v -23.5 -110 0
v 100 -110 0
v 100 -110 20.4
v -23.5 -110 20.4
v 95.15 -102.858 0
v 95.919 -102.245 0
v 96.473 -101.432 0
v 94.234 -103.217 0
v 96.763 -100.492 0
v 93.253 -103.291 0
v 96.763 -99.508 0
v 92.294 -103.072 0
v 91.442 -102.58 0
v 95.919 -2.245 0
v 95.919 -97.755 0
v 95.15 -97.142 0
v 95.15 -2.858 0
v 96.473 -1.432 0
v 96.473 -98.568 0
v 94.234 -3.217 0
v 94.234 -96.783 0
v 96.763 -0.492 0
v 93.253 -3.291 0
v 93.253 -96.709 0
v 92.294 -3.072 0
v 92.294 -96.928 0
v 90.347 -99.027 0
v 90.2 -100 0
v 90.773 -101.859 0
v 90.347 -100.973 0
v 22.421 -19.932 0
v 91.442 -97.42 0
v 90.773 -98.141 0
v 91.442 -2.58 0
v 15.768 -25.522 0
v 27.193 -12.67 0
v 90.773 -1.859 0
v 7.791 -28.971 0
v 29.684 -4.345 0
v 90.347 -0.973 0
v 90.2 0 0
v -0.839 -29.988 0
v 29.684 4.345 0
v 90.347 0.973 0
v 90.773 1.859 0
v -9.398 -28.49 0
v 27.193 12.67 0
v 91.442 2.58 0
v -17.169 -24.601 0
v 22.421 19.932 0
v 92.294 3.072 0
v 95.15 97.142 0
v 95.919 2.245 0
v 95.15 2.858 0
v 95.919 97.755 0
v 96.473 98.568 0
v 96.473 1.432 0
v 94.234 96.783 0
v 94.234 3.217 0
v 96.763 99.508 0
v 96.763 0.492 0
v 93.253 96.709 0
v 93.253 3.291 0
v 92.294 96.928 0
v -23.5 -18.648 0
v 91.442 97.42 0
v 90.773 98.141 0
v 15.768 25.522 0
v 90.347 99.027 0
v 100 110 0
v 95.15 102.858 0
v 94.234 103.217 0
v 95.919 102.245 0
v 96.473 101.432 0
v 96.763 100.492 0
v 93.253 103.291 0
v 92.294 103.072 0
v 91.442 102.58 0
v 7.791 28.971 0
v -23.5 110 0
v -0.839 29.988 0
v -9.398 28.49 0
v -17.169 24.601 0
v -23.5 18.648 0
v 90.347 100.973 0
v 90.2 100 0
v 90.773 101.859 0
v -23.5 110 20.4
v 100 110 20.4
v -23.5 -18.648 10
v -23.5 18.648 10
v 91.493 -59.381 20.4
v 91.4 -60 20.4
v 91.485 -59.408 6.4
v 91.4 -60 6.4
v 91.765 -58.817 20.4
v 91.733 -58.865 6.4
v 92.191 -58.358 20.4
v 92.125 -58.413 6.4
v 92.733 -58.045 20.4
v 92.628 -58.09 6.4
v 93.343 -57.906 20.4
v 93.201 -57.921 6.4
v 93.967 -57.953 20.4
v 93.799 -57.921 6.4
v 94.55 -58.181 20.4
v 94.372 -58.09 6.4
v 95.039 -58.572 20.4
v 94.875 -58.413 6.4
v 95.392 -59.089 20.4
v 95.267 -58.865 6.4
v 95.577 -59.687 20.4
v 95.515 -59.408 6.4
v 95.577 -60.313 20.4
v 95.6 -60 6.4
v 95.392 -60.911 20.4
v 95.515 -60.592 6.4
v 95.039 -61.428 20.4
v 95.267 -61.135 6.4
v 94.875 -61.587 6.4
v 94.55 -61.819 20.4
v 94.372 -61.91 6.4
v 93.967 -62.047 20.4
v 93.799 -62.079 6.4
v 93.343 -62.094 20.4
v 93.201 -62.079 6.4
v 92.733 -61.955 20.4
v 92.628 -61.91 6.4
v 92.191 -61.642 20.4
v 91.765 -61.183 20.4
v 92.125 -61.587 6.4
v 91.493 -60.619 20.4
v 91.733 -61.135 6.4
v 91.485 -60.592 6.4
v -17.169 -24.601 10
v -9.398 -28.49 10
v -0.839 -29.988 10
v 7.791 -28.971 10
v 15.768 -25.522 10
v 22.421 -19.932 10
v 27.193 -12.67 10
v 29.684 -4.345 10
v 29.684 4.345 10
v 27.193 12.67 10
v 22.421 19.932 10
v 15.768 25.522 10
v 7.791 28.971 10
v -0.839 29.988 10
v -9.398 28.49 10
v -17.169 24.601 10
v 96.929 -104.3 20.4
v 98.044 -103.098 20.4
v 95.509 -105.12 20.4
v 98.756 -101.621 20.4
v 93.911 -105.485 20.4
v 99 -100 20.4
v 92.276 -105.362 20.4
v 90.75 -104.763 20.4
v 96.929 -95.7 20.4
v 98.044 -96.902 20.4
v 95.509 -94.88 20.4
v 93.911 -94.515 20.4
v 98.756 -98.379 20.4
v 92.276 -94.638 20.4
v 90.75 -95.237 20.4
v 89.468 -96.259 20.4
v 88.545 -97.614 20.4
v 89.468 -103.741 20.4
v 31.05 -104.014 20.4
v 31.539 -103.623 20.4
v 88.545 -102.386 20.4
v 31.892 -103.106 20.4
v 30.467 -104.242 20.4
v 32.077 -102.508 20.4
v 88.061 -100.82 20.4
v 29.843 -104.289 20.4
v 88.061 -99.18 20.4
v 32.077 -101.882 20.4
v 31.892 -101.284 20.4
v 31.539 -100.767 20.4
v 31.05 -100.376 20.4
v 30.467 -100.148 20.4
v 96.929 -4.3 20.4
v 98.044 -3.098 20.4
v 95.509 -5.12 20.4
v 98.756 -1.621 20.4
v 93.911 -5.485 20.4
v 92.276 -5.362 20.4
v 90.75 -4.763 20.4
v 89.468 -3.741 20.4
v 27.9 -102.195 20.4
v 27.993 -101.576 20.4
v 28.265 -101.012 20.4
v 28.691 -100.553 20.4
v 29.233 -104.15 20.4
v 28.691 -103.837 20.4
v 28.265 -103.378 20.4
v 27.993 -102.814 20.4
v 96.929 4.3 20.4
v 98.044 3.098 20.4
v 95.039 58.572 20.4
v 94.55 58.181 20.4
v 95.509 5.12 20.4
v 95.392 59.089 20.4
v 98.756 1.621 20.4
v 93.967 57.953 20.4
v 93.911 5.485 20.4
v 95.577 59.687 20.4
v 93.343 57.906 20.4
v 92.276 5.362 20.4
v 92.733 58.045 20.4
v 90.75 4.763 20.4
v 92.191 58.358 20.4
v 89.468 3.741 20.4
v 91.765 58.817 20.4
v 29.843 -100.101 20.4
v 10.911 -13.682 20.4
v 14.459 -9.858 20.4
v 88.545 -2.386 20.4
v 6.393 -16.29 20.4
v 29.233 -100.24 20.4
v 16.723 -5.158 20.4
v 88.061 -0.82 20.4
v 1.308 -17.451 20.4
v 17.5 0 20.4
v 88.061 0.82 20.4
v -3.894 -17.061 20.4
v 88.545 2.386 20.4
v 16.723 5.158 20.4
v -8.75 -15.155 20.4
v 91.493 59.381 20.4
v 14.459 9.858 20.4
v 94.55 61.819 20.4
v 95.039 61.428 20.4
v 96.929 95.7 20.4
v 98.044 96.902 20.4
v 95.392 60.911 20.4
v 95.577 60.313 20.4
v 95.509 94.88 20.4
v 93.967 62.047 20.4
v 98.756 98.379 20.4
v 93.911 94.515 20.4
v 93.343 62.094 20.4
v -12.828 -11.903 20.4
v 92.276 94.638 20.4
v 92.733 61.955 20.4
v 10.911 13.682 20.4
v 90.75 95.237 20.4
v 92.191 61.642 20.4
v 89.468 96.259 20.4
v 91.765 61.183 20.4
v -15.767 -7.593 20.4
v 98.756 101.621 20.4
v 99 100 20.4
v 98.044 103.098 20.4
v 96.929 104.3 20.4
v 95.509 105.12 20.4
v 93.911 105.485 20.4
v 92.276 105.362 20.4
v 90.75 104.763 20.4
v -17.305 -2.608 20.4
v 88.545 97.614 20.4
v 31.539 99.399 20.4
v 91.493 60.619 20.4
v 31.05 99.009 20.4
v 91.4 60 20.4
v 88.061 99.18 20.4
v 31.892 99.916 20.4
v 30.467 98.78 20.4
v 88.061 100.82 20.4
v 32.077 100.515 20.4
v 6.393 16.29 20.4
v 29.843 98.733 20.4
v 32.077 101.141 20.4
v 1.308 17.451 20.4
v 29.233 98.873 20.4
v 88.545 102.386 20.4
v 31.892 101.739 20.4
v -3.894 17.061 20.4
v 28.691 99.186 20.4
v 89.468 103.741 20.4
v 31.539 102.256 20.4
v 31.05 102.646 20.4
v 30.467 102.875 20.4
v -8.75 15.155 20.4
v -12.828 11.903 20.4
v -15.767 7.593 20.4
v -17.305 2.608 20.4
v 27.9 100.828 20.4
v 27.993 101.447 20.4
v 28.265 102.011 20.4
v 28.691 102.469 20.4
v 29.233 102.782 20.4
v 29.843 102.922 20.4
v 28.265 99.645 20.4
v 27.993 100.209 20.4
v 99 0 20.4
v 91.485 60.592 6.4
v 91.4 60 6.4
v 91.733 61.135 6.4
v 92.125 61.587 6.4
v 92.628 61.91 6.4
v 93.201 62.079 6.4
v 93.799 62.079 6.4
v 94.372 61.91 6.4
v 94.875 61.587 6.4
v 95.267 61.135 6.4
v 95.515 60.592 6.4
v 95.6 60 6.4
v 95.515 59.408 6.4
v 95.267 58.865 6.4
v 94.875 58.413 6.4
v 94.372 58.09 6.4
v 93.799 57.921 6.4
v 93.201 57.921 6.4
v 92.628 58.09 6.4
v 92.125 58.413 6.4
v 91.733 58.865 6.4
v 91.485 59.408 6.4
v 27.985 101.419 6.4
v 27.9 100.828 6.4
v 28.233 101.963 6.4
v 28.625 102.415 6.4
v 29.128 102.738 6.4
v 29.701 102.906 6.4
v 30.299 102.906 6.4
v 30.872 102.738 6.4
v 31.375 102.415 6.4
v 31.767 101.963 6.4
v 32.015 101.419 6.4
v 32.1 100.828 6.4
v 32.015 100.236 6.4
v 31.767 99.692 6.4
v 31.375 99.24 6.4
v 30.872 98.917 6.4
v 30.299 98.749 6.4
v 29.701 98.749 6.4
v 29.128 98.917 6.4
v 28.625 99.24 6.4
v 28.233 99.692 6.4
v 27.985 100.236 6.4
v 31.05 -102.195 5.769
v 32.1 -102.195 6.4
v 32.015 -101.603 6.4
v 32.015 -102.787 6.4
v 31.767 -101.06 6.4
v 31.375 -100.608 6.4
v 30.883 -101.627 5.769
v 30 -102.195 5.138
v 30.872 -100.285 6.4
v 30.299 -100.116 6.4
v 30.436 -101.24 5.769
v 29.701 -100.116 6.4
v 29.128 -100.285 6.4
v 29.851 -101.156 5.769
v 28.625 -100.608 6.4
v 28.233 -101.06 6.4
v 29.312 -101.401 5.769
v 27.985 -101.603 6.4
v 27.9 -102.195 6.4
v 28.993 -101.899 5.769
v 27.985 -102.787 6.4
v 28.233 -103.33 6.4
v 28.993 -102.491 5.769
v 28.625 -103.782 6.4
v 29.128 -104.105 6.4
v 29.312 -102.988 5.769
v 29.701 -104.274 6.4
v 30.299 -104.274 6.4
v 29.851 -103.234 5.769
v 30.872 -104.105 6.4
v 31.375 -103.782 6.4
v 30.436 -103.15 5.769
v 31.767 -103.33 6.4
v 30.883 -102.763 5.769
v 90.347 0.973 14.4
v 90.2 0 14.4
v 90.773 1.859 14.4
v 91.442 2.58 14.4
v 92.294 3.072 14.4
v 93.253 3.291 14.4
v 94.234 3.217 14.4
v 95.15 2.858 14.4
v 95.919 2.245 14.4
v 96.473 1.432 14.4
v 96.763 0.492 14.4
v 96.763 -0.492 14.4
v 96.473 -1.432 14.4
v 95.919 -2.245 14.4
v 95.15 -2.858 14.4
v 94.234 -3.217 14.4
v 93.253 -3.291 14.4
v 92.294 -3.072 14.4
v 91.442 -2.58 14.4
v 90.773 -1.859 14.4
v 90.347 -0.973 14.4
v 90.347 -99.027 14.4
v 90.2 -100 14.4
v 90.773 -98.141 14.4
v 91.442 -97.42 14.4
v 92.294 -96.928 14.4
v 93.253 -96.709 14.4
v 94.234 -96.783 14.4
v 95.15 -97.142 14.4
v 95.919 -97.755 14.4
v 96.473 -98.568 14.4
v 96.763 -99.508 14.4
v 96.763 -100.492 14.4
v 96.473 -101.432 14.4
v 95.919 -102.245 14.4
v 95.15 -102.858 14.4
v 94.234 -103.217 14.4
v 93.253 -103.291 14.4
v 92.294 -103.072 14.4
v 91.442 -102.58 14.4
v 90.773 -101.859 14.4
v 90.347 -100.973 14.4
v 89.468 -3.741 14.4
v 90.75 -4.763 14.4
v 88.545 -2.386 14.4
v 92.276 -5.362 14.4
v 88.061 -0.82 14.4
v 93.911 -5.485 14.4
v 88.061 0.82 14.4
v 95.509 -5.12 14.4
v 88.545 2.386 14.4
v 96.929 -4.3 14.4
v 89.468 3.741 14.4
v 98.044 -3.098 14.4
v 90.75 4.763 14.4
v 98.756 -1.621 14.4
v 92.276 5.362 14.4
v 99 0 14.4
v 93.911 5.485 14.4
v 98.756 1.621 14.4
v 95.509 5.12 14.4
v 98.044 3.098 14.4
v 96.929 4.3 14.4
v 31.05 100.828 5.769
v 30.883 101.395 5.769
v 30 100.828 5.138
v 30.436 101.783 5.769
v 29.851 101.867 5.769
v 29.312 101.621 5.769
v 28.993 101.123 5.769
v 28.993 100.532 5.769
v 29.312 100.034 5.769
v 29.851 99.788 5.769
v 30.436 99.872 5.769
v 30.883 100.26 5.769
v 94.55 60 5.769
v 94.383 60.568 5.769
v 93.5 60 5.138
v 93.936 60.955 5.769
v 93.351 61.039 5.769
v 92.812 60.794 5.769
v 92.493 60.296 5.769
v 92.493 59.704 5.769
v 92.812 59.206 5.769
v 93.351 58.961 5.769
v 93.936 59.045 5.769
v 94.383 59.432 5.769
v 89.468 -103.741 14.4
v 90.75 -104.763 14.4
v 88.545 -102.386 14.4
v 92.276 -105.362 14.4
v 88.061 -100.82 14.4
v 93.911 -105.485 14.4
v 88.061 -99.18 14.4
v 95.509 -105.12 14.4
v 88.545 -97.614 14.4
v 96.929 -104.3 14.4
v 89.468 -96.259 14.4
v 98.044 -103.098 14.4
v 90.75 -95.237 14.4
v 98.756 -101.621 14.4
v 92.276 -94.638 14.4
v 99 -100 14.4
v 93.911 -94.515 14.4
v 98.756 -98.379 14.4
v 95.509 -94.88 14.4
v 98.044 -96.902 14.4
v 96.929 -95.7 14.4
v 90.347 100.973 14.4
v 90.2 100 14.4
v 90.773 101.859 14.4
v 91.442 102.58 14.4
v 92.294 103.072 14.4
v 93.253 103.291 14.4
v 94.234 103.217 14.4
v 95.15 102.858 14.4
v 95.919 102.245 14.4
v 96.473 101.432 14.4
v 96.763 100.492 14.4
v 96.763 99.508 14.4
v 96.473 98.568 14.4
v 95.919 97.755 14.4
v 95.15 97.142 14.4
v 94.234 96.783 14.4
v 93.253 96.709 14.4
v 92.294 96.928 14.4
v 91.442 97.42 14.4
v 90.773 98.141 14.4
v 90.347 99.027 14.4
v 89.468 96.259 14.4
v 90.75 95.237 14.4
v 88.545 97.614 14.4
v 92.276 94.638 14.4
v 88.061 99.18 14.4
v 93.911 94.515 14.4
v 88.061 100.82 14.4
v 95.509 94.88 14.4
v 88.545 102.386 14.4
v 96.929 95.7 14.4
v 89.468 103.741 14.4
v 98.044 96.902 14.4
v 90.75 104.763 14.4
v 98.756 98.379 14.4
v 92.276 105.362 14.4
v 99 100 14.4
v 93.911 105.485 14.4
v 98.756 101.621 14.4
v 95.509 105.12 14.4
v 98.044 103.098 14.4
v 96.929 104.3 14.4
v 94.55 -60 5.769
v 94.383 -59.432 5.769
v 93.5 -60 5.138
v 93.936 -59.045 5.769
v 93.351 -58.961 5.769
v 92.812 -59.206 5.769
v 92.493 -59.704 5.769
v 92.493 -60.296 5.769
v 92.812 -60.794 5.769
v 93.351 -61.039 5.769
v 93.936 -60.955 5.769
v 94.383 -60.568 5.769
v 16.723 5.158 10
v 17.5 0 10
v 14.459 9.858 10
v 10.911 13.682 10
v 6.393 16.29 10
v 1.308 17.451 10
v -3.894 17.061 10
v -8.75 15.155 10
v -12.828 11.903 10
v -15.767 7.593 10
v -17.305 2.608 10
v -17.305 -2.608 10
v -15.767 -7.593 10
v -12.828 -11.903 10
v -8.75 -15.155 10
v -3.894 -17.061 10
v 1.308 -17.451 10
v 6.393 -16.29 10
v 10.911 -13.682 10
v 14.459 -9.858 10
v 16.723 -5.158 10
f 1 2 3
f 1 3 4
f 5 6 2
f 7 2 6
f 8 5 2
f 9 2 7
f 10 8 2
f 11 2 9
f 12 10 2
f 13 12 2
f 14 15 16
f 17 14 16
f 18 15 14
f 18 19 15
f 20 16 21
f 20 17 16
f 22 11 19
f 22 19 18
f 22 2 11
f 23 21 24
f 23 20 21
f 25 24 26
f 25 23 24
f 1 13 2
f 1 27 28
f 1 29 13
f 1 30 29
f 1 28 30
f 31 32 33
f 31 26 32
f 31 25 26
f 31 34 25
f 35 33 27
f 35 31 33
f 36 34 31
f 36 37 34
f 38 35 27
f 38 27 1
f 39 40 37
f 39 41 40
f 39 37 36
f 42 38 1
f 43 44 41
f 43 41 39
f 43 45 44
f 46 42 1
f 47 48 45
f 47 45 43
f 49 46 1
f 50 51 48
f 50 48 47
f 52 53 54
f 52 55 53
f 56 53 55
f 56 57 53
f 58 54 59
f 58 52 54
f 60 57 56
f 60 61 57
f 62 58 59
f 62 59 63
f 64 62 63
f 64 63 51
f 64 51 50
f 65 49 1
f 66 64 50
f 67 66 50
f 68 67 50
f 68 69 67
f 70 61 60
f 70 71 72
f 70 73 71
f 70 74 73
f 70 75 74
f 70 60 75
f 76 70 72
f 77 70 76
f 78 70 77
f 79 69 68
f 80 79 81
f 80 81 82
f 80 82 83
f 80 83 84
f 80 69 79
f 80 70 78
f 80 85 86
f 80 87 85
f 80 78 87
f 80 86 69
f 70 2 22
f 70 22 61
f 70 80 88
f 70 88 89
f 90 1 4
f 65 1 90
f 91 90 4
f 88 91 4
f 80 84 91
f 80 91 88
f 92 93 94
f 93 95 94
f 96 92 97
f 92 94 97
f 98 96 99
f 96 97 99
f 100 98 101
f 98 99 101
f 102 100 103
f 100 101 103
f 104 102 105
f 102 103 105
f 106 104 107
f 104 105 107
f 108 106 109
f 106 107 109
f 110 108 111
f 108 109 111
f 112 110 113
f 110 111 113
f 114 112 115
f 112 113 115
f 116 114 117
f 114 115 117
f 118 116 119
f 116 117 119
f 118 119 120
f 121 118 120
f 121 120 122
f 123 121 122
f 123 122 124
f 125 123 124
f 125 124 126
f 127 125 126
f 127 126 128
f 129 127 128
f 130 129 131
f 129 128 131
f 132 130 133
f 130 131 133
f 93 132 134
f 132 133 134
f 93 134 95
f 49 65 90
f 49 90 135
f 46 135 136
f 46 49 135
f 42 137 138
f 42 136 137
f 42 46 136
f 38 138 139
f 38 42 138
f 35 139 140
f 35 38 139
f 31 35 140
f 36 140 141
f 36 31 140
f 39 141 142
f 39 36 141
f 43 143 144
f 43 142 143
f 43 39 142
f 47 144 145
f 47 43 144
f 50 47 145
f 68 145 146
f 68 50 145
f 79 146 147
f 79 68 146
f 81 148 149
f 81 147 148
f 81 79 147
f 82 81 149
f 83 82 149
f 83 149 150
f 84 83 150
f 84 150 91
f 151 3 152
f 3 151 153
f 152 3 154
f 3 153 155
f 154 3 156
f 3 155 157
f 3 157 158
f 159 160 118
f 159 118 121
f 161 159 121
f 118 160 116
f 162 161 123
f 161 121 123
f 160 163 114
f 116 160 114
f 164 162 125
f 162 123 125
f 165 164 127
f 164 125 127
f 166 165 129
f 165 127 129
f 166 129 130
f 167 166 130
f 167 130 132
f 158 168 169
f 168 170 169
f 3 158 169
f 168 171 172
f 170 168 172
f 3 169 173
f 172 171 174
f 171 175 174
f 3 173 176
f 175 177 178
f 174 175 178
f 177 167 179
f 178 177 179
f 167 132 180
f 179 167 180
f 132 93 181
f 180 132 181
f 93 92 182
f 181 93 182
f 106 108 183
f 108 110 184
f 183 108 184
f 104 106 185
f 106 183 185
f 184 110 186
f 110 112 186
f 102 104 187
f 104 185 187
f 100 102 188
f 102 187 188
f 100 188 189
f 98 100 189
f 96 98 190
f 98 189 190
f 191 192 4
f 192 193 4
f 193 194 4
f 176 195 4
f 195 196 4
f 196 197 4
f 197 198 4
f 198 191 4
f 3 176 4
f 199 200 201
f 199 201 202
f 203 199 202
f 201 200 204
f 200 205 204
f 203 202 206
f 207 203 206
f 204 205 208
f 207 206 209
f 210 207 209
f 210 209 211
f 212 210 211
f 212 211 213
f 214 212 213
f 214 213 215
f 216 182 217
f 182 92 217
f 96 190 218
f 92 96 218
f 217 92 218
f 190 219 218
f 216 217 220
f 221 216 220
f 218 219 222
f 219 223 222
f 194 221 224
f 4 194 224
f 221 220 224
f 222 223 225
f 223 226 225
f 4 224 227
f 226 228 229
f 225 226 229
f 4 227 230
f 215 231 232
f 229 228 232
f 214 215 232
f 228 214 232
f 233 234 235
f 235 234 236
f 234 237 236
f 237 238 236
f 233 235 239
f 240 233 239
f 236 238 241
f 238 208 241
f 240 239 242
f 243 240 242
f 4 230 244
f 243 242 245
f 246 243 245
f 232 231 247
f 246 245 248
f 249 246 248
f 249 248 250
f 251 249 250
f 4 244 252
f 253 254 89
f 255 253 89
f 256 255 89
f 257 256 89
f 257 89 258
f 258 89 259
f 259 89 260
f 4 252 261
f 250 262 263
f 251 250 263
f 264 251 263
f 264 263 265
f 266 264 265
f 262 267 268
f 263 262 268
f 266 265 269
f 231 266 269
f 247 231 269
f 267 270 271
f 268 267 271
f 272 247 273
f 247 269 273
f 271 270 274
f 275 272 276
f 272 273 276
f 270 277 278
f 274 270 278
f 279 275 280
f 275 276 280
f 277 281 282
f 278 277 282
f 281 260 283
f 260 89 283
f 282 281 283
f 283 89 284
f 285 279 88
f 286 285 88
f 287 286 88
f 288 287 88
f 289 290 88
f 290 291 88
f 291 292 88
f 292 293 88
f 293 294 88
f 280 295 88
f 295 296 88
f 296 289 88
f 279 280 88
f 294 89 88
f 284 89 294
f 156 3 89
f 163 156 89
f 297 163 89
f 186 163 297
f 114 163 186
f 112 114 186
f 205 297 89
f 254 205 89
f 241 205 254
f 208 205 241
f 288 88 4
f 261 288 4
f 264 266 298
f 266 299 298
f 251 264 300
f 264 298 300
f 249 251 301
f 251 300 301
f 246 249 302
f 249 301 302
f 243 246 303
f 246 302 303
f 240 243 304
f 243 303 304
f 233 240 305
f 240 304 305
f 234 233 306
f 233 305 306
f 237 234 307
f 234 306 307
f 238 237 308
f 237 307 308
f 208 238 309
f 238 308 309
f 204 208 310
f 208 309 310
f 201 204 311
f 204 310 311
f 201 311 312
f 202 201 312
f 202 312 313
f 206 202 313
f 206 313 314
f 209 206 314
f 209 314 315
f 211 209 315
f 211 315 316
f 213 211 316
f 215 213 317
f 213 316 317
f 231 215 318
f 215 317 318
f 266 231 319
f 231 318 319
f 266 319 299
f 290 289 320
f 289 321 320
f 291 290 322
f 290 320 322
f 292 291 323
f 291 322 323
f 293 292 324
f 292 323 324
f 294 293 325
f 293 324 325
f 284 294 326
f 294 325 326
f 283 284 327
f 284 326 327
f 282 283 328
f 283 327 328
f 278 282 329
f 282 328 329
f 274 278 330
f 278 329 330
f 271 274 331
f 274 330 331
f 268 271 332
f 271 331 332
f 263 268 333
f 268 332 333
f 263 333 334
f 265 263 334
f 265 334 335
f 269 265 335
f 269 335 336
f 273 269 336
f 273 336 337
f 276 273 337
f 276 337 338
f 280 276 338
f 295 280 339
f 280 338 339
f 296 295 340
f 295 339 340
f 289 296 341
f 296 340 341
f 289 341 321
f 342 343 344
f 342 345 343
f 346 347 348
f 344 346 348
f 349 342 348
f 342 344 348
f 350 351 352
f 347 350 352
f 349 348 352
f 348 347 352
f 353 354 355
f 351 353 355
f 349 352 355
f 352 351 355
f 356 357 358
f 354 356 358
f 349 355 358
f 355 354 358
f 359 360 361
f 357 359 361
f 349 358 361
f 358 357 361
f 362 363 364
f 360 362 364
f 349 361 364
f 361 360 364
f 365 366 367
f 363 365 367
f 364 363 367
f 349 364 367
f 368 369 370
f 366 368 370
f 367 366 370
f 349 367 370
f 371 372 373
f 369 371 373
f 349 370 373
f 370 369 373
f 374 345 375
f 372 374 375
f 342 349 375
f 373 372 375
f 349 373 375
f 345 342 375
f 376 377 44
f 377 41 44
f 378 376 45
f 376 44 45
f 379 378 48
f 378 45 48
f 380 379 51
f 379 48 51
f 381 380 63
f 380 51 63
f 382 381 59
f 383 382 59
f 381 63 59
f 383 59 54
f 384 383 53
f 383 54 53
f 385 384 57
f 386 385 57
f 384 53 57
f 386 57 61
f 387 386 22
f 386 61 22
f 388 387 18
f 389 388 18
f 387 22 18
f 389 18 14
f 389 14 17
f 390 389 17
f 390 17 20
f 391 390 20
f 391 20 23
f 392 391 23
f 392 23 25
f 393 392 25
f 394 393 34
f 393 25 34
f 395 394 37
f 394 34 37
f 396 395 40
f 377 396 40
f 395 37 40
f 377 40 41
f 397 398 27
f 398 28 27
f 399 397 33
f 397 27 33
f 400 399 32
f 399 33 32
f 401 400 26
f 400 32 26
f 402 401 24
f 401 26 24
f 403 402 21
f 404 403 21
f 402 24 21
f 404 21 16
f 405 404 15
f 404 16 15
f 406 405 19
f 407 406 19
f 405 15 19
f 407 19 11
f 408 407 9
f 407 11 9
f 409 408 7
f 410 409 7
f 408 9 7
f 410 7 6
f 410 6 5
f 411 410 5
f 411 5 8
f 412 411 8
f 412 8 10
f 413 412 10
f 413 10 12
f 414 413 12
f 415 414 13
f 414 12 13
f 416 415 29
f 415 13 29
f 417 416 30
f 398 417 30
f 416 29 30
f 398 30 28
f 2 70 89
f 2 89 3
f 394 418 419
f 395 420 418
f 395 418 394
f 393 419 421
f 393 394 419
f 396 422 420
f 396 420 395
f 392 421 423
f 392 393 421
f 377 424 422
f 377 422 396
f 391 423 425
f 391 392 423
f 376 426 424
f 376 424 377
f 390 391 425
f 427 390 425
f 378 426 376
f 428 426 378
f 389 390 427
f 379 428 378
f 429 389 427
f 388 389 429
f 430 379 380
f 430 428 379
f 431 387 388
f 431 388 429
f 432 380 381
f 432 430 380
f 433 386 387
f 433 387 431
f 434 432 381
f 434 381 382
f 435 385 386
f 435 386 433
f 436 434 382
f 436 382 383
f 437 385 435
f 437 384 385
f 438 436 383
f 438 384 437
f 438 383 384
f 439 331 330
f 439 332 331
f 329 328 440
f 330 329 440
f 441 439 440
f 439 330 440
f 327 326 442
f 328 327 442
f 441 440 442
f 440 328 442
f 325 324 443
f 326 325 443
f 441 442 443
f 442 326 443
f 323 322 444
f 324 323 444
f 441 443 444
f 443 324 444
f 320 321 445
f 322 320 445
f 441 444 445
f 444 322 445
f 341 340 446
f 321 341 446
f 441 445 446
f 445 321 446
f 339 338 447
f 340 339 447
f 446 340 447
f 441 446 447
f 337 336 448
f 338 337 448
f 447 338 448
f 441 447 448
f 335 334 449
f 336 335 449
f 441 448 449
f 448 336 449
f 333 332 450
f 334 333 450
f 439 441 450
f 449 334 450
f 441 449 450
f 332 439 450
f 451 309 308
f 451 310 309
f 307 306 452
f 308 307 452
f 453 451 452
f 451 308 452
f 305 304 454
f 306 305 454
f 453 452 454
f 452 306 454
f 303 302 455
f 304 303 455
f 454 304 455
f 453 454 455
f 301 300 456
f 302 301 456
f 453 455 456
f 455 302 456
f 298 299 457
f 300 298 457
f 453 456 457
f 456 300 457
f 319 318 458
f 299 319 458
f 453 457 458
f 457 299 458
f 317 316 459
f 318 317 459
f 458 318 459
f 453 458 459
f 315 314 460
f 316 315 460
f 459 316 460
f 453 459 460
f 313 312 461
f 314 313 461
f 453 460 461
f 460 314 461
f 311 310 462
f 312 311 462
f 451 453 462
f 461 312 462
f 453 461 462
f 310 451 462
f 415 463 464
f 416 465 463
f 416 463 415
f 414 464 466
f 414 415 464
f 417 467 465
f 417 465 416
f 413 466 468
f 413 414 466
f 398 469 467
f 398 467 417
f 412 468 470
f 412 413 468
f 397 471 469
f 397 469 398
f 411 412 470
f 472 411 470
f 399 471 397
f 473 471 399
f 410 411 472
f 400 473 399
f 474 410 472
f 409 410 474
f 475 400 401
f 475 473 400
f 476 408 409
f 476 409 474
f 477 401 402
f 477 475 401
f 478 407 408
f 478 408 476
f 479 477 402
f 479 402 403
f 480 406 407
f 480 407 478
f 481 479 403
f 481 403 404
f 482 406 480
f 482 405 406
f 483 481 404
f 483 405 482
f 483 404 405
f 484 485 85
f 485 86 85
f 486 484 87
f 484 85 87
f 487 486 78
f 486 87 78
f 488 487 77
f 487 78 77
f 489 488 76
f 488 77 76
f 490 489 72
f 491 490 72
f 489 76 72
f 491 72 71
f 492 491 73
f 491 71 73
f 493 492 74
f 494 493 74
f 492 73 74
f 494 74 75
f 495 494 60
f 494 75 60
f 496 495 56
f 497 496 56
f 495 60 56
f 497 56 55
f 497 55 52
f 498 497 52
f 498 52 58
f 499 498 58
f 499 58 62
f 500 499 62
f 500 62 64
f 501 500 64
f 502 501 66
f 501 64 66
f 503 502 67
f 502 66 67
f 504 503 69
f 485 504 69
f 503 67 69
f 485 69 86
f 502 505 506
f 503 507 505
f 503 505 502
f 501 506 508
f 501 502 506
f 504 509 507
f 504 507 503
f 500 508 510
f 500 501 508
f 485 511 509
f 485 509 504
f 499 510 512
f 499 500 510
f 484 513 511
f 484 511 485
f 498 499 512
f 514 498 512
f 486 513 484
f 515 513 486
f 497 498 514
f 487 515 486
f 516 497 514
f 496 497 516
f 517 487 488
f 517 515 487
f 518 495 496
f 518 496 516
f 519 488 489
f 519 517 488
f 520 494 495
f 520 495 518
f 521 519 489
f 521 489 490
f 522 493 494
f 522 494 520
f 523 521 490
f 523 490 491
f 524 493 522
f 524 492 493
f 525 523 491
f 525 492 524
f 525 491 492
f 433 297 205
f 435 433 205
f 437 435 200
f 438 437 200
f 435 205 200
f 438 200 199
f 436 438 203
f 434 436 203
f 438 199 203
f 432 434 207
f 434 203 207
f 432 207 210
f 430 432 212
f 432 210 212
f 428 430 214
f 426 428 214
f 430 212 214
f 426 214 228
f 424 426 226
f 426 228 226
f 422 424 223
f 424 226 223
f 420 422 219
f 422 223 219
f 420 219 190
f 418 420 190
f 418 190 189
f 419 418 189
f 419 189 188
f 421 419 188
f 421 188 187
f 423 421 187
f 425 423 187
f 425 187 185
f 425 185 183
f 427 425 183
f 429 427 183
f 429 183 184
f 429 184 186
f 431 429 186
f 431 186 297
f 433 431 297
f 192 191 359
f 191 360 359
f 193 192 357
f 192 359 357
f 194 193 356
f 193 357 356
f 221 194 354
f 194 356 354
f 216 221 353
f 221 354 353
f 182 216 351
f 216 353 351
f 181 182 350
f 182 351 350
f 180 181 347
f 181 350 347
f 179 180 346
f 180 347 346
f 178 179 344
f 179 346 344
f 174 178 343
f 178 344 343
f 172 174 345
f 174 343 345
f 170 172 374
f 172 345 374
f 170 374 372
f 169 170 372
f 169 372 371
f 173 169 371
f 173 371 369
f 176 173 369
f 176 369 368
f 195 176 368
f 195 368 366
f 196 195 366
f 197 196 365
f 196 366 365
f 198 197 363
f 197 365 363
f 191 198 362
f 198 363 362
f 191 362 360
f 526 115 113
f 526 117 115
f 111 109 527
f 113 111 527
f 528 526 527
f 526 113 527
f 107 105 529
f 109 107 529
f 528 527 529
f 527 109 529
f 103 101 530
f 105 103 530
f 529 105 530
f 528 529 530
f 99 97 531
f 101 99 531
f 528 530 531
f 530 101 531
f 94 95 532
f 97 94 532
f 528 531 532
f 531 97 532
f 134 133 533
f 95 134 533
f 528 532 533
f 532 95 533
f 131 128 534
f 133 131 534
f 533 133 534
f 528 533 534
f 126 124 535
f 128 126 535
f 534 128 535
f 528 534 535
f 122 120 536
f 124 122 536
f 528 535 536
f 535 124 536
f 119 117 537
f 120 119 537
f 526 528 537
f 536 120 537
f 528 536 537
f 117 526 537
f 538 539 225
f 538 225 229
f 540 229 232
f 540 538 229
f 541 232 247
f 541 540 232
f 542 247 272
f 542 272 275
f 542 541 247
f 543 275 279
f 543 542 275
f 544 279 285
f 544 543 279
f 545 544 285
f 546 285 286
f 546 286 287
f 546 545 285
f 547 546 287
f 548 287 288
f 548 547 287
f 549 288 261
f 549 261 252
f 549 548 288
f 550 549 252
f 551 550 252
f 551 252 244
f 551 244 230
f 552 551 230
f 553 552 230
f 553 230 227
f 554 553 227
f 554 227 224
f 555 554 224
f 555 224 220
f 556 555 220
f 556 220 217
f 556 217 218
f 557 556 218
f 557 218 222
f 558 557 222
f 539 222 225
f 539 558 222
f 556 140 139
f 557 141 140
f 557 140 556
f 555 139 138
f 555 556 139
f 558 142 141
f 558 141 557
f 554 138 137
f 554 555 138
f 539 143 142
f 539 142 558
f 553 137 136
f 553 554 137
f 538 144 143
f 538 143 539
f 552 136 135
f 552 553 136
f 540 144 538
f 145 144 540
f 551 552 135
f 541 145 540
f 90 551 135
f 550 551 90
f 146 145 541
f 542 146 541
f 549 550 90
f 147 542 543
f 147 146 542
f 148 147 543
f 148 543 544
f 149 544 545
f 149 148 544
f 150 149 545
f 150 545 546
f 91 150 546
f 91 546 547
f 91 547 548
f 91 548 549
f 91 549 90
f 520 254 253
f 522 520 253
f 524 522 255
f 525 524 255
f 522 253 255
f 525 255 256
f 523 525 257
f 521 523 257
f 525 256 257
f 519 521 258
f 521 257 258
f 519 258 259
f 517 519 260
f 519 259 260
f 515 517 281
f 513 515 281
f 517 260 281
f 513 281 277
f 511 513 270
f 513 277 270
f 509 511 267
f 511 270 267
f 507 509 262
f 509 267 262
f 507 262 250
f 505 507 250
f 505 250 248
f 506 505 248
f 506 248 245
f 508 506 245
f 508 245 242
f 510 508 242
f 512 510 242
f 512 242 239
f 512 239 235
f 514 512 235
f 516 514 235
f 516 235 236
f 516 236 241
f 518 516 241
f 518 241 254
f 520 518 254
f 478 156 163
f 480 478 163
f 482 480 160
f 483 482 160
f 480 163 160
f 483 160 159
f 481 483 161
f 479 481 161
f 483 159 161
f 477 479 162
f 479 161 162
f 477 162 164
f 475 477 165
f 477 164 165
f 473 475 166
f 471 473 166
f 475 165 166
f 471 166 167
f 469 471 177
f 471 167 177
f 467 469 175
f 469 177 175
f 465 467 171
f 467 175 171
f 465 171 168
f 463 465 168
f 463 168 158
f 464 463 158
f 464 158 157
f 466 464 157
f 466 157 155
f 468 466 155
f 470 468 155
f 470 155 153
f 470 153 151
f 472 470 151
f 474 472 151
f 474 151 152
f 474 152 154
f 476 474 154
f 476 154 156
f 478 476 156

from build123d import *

# Parameters (mm, degrees)
RESSALTO_EXTRUS_O1_DEPTH          = 20.4
REBAIXO_PARA_SHCS_M61_D           = 6.6
REBAIXO_PARA_SHCS_M61_CBORE_D     = 11
REBAIXO_PARA_SHCS_M61_CBORE_DEPTH = 6
ESBO_O14_R                        = 17.5
RESSALTO_EXTRUS_O2_DEPTH          = 10.4
FURO_ROSCADO_DE_M5X0_81_D         = 4.2
FURO_ROSCADO_DE_M5X0_81_DEPTH     = 14
FURO_ROSCADO_DE_M5X0_81_TIP       = 1.2618073


with BuildPart() as part:
    # Esboço1 → Ressalto-extrusão1 (new body)
    with BuildSketch(Plane.XY):
        with BuildLine():
            Line((-23.5, 110), (100, 110))
            Line((100, 110), (100, -110))
            Line((100, -110), (-23.5, -110))
            Line((-23.5, -110), (-23.5, -18.648056199))
            ThreePointArc((-23.5, -18.648056199), (30, 0), (-23.5, 18.648056199))
            Line((-23.5, 18.648056199), (-23.5, 110))
        make_face()
    extrude(amount=RESSALTO_EXTRUS_O1_DEPTH)

    # Rebaixo para SHCS M61 (through all)
    with Locations(Plane.XY.offset(20.4)):
        with Locations((93.5, 100), (93.5, 0), (93.5, -100)):
            CounterBoreHole(REBAIXO_PARA_SHCS_M61_D / 2, REBAIXO_PARA_SHCS_M61_CBORE_D / 2, REBAIXO_PARA_SHCS_M61_CBORE_DEPTH)

    # Esboço14 → Ressalto-extrusão2 (add)
    with BuildSketch(Plane.XY.offset(10)):
        with BuildLine():
            Line((-23.5, -18.648056199), (-23.5, 18.648056199))
            ThreePointArc((-23.5, 18.648056199), (30, 0), (-23.5, -18.648056199))
        make_face()
        Circle(ESBO_O14_R, mode=Mode.SUBTRACT)
    extrude(amount=RESSALTO_EXTRUS_O2_DEPTH)

    # Furo roscado de M5x0.81
    with Locations(Plane.XY.offset(20.4)):
        with Locations((30, 100.827560784), (93.5, 60), (93.5, -60), (30, -102.194888391)):
            Hole(FURO_ROSCADO_DE_M5X0_81_D / 2, depth=FURO_ROSCADO_DE_M5X0_81_DEPTH)
            with Locations((0, 0, -(FURO_ROSCADO_DE_M5X0_81_DEPTH + FURO_ROSCADO_DE_M5X0_81_TIP / 2))):  # 118° drill point
                Cone(0, FURO_ROSCADO_DE_M5X0_81_D / 2, FURO_ROSCADO_DE_M5X0_81_TIP, mode=Mode.SUBTRACT)


solid = part.part
